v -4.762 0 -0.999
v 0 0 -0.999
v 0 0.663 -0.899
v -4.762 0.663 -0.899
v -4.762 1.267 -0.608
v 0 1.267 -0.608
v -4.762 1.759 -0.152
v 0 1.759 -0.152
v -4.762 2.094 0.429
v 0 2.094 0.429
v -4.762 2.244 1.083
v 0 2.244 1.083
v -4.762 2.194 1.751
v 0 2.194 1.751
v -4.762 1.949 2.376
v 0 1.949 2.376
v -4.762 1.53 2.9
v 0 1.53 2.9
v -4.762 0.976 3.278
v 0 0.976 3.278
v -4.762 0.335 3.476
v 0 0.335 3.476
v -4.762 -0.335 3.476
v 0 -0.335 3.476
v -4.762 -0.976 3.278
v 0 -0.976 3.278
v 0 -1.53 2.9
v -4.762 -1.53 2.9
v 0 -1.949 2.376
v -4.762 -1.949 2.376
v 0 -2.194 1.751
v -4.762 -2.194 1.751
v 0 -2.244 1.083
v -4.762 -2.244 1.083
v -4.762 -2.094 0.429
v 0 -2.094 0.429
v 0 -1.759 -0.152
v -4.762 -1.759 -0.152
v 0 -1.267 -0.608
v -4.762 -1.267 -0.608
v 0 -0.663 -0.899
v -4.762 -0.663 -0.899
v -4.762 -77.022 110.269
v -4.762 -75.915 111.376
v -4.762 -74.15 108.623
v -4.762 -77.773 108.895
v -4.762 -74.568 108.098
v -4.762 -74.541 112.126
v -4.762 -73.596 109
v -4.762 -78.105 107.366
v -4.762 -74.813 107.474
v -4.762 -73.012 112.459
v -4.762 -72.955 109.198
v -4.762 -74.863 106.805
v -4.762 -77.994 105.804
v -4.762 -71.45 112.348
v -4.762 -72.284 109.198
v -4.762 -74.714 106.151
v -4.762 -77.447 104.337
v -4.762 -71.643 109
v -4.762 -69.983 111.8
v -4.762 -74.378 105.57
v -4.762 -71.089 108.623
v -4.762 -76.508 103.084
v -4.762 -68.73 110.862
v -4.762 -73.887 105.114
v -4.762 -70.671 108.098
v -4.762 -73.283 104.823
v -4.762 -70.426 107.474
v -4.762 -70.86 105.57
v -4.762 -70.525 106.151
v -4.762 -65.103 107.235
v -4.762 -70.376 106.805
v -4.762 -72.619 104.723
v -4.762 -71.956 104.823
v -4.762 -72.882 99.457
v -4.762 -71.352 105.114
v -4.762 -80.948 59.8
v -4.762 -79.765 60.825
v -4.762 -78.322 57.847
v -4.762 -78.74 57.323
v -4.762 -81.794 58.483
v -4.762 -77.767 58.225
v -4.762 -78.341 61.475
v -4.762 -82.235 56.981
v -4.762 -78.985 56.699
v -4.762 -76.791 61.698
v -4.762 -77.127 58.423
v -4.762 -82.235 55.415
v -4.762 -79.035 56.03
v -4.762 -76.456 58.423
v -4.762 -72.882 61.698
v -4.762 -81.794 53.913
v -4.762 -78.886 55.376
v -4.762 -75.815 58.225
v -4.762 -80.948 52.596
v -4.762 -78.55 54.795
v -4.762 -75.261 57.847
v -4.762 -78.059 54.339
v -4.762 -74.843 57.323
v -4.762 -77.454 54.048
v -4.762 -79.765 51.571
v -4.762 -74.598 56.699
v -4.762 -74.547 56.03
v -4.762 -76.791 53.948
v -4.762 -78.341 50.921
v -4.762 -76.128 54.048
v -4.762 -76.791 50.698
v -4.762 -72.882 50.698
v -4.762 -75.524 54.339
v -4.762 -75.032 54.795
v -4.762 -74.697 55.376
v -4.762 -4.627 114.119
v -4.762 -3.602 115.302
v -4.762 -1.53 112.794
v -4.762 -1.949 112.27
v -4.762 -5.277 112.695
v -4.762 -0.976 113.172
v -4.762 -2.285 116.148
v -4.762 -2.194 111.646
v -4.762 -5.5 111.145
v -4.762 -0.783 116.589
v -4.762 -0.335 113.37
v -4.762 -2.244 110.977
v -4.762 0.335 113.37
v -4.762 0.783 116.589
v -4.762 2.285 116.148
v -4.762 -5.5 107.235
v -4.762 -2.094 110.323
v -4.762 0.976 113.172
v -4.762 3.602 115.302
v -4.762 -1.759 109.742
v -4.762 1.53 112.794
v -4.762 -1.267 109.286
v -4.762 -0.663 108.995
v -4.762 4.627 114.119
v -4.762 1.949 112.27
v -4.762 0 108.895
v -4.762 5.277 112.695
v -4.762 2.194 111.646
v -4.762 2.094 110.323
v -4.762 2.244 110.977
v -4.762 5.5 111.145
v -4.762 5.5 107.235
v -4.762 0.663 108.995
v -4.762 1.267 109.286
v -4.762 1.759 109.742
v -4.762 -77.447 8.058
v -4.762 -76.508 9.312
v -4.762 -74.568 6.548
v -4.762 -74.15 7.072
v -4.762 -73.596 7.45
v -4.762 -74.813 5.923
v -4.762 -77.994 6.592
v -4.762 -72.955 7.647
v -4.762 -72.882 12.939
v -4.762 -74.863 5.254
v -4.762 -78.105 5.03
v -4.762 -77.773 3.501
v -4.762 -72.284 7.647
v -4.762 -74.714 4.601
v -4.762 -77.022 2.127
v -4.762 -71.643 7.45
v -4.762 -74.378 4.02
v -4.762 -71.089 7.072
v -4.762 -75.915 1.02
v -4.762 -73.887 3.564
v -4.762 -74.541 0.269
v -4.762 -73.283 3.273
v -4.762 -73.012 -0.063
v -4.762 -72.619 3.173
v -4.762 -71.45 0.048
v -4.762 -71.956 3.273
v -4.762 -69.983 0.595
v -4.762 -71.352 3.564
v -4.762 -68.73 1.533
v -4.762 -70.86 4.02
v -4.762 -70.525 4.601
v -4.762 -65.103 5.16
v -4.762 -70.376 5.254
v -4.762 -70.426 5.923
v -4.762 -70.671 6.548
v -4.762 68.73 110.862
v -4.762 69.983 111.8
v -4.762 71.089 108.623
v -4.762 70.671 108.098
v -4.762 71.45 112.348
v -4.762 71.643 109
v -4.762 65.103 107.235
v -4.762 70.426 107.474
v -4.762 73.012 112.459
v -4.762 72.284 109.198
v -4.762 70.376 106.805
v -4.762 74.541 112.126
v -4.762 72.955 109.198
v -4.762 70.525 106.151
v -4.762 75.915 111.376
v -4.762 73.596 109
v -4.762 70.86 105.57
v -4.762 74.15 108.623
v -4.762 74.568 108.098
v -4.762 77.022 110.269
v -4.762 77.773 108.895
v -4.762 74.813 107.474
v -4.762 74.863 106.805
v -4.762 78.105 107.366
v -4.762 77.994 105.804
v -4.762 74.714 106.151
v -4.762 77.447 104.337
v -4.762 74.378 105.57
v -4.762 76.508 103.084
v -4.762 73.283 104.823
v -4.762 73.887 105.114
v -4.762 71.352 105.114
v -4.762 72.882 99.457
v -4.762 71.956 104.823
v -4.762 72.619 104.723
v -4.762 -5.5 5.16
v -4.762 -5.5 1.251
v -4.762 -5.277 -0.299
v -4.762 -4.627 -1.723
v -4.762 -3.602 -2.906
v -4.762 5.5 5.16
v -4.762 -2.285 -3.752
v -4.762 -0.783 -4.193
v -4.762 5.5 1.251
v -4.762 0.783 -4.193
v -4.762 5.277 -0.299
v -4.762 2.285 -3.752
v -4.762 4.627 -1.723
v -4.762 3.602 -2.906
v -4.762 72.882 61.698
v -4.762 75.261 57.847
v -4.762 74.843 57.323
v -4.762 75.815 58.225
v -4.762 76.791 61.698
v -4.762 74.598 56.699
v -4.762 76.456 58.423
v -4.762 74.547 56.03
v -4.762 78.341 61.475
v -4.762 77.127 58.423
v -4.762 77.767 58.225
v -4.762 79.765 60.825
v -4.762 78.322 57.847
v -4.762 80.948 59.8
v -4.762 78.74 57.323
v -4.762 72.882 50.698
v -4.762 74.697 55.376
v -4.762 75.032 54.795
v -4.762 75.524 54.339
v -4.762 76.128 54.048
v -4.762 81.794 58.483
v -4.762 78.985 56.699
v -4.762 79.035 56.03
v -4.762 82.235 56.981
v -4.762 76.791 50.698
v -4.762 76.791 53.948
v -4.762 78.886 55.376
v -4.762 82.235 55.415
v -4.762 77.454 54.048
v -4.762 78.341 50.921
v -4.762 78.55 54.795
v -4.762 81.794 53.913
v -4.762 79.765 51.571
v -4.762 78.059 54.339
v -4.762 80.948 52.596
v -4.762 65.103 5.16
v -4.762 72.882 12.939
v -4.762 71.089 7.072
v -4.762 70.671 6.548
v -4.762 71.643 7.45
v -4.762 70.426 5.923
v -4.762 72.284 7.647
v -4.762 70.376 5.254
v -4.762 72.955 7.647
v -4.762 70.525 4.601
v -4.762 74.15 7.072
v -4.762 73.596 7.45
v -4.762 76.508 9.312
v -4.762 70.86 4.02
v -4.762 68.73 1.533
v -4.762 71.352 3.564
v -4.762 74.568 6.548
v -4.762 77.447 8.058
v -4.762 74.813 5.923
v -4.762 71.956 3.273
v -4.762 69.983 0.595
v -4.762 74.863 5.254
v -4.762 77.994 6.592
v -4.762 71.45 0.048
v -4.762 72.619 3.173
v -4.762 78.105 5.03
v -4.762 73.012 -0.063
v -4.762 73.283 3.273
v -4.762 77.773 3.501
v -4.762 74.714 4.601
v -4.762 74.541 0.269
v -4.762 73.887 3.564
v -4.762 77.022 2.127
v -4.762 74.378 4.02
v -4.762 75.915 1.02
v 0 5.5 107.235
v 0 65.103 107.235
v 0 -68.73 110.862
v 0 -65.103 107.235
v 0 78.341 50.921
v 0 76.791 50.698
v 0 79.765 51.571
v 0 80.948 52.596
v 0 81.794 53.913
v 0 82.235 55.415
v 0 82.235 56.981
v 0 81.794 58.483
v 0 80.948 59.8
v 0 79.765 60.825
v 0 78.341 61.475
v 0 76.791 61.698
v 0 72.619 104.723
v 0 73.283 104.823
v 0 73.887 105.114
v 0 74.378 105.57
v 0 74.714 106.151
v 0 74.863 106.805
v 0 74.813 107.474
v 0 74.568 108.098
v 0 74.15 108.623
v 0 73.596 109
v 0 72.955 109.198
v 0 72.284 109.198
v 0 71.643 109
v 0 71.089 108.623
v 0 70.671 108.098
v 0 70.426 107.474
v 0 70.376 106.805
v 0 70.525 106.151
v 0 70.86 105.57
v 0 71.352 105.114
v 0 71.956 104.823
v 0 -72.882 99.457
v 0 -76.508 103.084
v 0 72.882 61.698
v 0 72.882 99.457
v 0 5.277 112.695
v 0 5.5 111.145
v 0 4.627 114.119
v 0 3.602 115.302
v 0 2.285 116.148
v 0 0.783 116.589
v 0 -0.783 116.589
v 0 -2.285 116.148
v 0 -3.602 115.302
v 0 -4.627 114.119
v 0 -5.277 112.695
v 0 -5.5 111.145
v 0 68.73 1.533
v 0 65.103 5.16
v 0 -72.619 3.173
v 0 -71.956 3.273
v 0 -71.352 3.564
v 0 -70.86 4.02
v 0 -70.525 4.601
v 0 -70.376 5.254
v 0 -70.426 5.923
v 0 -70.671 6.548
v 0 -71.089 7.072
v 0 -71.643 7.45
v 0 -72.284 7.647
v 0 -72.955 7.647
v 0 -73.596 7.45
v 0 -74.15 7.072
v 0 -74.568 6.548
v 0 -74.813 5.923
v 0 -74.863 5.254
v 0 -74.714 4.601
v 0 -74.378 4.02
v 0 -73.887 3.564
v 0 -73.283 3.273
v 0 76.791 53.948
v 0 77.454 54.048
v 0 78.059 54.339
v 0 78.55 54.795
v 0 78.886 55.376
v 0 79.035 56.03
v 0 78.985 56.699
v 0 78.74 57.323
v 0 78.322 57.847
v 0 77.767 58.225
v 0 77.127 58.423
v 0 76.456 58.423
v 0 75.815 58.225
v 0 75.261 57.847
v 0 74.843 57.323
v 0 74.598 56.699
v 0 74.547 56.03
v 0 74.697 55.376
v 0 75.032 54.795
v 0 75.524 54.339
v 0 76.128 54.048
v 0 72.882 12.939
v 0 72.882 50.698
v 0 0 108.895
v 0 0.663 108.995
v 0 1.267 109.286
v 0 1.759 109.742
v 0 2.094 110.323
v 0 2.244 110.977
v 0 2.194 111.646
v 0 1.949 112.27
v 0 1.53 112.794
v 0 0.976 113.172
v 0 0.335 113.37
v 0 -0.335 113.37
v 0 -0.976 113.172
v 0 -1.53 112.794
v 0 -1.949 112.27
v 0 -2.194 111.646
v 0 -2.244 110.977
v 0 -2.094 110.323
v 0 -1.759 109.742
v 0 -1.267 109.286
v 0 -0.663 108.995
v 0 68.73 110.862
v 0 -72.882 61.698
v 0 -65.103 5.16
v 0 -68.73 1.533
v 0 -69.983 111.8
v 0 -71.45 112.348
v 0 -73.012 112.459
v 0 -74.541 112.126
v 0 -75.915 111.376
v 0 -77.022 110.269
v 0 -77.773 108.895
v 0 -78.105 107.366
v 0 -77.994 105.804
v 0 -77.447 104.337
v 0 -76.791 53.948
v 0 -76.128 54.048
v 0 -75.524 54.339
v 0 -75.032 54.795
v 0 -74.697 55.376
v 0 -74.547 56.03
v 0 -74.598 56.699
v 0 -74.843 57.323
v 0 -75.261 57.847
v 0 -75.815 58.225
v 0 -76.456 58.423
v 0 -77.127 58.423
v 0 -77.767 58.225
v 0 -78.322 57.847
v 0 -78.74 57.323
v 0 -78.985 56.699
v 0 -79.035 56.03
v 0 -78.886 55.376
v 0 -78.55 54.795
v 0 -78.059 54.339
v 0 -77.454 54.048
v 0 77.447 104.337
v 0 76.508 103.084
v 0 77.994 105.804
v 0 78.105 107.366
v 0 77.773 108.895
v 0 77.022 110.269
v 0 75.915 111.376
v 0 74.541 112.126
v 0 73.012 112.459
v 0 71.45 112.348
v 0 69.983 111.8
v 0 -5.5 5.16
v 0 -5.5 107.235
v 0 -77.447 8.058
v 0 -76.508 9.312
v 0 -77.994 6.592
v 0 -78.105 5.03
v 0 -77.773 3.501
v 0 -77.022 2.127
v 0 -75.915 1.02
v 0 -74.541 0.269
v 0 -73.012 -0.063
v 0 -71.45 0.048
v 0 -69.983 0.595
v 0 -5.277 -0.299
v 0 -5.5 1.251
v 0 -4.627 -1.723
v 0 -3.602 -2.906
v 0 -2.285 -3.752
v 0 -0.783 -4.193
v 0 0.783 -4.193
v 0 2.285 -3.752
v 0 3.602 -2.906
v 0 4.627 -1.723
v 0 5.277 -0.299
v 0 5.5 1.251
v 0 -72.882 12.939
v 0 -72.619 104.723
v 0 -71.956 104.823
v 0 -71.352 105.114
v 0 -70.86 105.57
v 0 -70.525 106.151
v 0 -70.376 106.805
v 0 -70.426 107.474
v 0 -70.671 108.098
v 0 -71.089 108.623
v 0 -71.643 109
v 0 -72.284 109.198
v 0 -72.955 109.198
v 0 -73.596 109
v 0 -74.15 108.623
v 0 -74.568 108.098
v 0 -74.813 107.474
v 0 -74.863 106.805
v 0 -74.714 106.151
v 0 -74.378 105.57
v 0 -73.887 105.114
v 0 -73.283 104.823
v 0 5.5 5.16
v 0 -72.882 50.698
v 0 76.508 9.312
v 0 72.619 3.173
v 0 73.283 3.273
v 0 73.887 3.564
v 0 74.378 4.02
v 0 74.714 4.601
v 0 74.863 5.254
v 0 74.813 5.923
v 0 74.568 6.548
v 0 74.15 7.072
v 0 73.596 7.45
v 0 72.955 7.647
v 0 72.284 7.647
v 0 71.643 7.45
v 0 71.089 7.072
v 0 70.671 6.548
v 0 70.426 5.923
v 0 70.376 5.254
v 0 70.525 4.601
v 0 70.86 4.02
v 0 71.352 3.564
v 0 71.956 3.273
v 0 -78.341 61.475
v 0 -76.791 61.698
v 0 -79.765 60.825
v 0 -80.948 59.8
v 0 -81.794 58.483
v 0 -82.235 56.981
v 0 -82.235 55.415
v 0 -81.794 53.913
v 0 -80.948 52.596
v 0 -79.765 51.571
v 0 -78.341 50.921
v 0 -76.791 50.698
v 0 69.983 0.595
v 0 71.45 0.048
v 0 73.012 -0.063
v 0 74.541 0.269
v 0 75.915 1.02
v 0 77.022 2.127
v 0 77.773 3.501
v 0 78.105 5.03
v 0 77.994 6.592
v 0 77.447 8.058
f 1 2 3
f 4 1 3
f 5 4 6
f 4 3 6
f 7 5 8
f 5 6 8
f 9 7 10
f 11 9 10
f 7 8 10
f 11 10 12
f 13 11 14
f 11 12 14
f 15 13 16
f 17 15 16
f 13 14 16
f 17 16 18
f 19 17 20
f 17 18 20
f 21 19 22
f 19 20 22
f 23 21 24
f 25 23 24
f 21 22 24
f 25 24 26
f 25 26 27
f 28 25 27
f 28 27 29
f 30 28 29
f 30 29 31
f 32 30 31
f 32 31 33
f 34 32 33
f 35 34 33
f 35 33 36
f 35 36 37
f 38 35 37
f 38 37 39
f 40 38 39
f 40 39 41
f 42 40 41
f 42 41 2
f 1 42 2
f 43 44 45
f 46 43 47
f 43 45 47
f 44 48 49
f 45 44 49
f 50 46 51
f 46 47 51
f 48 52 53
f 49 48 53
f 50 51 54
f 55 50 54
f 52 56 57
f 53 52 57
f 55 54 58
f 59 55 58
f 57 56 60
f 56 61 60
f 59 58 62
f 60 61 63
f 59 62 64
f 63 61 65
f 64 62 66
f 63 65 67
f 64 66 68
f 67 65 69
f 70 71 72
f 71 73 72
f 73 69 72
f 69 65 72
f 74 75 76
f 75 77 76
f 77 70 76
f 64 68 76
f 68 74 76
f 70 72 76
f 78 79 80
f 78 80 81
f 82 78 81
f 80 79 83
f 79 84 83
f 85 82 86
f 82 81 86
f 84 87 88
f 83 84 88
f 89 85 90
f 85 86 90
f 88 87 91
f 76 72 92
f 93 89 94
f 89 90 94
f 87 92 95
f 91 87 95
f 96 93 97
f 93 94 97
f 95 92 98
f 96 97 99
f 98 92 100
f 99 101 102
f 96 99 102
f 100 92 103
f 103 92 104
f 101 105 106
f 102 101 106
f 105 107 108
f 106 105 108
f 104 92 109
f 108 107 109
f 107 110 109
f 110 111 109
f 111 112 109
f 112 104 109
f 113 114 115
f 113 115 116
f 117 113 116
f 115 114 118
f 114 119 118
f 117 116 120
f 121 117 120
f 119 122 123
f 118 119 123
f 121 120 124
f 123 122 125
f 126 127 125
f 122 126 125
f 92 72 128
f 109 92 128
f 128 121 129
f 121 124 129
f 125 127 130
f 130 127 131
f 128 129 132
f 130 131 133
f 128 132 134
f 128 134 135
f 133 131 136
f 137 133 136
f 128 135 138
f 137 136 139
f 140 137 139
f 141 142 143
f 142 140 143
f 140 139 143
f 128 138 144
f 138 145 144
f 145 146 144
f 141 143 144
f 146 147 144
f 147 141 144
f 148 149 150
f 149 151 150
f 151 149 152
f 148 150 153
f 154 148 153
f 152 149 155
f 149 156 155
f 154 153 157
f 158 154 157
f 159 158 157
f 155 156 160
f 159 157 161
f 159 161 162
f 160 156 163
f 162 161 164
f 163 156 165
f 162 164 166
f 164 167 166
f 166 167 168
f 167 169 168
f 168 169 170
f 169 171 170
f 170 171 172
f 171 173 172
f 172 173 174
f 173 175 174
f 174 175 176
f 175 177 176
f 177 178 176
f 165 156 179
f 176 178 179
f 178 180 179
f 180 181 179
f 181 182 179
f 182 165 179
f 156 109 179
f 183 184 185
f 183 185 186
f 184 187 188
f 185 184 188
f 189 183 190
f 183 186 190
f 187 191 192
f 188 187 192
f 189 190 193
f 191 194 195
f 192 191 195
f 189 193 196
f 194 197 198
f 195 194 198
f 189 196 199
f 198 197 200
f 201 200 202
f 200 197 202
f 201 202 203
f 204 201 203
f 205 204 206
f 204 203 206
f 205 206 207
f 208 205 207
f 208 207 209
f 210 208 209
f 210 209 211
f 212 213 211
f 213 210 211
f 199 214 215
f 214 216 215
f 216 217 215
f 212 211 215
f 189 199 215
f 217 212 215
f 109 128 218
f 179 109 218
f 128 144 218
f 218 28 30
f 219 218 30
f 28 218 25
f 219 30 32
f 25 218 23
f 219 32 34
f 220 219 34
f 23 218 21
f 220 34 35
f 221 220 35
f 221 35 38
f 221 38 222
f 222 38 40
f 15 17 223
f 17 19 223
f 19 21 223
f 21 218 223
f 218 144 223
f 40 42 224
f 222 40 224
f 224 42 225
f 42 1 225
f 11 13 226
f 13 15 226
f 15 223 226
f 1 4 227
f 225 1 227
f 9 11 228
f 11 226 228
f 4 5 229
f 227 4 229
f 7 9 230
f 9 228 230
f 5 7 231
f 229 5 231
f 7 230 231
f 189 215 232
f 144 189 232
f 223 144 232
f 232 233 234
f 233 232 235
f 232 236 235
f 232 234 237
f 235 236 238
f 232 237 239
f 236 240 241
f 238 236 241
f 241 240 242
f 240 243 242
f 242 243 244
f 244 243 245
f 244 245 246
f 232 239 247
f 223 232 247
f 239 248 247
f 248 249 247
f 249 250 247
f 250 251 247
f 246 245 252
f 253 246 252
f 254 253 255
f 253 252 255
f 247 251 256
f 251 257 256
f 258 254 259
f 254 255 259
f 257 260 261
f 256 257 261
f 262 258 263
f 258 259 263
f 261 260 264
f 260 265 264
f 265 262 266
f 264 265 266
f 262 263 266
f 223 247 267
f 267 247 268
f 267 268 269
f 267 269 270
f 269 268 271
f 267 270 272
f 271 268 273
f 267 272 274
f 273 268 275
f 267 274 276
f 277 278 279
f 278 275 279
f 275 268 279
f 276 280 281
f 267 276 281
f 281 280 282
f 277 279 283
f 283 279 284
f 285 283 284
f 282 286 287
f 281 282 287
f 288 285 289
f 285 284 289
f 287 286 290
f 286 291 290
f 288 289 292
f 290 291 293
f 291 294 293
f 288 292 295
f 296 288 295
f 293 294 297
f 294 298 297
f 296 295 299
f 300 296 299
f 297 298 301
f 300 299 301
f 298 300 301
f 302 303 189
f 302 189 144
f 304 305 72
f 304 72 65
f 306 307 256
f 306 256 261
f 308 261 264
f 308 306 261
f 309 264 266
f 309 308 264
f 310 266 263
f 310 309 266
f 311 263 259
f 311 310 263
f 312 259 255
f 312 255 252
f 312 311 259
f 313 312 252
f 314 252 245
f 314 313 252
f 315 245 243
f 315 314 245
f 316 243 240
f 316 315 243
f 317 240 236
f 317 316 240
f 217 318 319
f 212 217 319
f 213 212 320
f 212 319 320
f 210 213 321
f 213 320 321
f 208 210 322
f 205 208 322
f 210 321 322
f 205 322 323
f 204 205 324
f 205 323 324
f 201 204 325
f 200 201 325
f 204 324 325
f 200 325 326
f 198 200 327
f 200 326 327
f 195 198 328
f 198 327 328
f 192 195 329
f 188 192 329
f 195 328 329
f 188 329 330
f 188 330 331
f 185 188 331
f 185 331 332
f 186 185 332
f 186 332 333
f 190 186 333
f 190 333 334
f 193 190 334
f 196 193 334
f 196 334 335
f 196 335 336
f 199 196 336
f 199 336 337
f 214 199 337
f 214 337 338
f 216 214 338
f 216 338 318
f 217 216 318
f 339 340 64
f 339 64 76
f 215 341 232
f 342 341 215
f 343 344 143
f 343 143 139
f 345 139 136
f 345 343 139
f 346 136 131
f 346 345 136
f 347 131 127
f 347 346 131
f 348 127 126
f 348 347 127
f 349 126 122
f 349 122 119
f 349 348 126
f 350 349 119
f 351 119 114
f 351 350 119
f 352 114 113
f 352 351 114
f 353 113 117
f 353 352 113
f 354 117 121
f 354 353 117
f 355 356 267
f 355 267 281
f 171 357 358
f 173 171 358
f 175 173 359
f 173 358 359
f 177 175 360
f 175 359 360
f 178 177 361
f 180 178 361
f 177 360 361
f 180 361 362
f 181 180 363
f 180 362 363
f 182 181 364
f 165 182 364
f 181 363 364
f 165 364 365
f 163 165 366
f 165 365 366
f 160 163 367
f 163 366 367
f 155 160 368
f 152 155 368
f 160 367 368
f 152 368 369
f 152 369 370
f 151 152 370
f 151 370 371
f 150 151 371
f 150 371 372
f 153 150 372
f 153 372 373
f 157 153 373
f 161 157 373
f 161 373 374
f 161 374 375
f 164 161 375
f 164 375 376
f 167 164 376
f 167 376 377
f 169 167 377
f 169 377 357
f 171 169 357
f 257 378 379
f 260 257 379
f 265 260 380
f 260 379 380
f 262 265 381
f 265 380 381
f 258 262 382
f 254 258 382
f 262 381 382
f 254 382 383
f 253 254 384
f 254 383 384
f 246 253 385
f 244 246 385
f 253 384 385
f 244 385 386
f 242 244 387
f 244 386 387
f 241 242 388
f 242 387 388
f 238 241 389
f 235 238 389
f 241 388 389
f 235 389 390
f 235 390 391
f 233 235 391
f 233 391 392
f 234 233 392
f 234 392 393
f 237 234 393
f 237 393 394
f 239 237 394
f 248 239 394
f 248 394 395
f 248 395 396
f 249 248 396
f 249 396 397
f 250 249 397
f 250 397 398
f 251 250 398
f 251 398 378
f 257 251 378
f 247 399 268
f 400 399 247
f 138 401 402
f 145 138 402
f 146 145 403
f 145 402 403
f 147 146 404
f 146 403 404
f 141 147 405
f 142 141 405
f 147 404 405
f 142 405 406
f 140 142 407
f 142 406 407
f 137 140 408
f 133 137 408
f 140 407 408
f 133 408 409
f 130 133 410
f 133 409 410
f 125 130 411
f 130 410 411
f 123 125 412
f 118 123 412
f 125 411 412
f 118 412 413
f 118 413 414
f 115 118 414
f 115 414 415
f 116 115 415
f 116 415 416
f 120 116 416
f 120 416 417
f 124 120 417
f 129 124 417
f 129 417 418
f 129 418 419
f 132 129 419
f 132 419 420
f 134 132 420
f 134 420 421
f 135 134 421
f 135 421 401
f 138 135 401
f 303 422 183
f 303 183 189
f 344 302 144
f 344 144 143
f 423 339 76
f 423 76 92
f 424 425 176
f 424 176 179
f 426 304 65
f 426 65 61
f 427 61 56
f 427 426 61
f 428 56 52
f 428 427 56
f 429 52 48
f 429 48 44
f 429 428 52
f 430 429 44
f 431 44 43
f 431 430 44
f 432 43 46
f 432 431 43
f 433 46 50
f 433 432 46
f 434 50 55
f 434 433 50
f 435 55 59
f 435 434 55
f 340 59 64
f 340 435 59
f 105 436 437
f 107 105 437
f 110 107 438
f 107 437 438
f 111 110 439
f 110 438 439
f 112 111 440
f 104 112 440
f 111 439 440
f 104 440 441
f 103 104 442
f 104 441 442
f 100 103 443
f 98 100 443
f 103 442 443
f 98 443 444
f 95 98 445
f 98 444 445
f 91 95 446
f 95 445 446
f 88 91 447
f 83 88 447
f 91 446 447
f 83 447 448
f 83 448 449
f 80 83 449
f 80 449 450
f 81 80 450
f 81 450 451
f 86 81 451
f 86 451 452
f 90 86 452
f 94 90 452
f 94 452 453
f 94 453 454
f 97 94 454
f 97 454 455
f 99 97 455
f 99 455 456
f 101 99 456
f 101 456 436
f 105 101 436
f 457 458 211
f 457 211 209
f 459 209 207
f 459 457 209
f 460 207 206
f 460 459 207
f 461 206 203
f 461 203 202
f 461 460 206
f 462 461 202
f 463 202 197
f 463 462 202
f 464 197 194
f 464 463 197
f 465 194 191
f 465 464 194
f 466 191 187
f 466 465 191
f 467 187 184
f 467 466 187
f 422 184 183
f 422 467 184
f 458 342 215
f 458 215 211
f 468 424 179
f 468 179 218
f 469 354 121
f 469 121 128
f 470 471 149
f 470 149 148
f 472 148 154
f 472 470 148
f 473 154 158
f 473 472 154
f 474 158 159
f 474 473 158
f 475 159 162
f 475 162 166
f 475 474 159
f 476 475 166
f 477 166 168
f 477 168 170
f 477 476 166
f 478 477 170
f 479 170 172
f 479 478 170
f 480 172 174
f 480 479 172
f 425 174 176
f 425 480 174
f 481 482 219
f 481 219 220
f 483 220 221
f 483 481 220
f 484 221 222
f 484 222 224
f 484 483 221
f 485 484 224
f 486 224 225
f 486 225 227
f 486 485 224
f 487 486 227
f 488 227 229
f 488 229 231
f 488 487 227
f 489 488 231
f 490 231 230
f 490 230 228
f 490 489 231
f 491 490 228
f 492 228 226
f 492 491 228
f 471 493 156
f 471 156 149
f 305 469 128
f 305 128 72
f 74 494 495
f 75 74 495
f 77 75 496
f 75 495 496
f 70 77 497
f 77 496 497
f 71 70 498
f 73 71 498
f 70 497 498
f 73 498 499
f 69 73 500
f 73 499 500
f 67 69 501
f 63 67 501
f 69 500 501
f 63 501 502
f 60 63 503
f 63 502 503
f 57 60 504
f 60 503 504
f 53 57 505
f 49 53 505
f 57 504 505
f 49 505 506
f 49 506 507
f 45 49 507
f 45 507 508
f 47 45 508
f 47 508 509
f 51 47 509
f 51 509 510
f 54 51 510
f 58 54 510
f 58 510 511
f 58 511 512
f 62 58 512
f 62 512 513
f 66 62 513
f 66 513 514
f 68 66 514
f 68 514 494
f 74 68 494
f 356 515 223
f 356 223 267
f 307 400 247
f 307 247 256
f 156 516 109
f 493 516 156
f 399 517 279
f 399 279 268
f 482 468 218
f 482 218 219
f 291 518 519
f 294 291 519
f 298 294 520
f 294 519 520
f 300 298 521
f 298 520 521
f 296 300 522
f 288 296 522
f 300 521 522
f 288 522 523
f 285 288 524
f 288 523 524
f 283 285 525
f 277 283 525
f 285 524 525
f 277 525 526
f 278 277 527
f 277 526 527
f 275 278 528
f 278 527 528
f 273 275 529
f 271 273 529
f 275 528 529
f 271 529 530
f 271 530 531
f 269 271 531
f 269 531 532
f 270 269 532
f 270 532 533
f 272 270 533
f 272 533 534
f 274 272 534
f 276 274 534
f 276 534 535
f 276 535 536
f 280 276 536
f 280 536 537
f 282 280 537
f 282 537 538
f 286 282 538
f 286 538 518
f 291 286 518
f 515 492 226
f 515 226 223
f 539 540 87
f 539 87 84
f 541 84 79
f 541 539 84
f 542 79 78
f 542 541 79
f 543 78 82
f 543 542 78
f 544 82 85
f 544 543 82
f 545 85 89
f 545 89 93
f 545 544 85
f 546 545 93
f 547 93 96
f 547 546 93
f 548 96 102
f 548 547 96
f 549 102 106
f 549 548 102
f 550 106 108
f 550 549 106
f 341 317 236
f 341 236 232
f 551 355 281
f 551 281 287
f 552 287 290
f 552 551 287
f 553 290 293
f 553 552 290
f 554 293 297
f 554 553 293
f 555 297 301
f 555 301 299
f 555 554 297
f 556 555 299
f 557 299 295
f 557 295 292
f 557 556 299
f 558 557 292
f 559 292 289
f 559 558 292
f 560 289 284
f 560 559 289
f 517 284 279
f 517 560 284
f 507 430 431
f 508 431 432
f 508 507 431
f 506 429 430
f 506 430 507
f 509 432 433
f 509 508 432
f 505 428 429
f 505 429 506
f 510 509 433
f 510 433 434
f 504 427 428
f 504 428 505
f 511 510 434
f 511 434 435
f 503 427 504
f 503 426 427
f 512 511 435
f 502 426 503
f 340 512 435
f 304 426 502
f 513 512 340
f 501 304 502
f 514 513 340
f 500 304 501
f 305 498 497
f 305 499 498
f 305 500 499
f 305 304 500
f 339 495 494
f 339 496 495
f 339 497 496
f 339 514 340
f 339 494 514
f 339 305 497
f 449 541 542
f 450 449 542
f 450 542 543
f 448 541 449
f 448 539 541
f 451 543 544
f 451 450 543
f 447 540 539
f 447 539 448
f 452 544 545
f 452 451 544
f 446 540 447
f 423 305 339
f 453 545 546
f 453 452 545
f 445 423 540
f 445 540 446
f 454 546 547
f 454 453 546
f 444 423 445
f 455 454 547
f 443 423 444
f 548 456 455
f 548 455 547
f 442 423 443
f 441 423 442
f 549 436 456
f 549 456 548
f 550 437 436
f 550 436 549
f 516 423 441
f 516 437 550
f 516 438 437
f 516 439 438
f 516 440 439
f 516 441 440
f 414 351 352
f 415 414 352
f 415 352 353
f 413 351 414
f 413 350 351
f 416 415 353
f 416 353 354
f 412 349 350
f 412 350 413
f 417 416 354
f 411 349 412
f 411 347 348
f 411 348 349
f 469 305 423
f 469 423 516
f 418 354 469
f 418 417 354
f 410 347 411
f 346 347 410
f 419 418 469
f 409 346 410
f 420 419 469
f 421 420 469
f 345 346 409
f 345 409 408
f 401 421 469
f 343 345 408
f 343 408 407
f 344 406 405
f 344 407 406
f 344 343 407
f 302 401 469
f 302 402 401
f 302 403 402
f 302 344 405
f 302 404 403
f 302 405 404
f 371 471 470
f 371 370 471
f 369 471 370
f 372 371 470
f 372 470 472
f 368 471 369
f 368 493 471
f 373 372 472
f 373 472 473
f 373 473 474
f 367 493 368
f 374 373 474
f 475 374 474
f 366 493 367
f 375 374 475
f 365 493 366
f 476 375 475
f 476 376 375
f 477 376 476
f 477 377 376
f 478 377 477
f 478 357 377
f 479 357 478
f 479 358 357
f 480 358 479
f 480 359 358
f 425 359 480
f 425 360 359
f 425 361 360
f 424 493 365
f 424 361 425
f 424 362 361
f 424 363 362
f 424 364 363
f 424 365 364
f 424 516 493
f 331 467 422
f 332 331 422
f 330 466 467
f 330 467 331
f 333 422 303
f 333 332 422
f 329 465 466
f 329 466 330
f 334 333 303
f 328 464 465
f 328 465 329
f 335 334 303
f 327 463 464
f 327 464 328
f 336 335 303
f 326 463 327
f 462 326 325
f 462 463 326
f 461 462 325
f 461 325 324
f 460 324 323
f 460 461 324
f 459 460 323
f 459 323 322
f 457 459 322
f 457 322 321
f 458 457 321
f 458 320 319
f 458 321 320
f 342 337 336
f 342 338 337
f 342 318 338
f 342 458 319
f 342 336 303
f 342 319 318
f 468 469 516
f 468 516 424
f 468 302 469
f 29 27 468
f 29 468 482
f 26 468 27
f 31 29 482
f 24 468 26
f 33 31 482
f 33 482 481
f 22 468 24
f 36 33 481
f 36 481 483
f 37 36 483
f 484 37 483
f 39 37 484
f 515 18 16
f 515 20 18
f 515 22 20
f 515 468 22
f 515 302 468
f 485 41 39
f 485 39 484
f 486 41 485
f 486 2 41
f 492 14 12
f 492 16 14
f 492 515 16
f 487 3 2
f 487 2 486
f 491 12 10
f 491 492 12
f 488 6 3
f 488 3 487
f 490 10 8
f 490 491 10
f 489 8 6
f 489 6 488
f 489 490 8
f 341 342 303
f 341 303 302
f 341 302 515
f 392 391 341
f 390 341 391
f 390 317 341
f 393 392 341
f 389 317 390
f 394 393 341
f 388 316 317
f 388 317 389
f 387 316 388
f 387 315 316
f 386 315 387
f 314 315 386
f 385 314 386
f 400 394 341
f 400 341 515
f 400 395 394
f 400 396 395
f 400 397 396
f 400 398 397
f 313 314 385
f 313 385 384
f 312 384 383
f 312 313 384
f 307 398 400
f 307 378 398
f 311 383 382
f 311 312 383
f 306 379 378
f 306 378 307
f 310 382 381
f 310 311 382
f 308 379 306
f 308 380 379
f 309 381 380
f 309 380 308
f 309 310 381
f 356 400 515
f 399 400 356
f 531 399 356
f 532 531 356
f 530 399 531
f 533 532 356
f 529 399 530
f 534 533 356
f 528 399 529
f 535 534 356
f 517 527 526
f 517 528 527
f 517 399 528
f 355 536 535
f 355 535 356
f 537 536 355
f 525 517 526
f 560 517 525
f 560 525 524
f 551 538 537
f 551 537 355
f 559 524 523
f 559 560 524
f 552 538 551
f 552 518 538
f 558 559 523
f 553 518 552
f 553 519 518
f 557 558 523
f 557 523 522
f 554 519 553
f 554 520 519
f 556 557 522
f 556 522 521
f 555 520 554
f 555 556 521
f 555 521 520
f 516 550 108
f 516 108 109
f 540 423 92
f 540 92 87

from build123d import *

# Parameters (mm, degrees)
BOSS_EXTRUDE1_DEPTH  = 4.7625
M4_CLEARANCE_HOLE1_D = 4.5


with BuildPart() as part:
    # Sketch1 → Boss-Extrude1 (new body)
    with BuildSketch(Plane(origin=(0, 0, 0), x_dir=(0, 0, -1), z_dir=(1, 0, 0))):
        with BuildLine():
            Line((-12.938571051, 72.8815), (-50.697896458, 72.8815))
            Line((-50.697896458, 72.8815), (-50.697896458, 76.7912))
            ThreePointArc((-50.697896458, 76.7912), (-56.197896458, 82.2912), (-61.697896458, 76.7912))
            Line((-61.697896458, 76.7912), (-61.697896458, 72.8815))
            Line((-61.697896458, 72.8815), (-99.457221865, 72.8815))
            Line((-99.457221865, 72.8815), (-103.084126021, 76.508404156))
            ThreePointArc((-103.084126021, 76.508404156), (-110.862300614, 76.508404156), (-110.862300614, 68.730229563))
            Line((-110.862300614, 68.730229563), (-107.235396458, 65.103325407))
            Line((-107.235396458, 65.103325407), (-107.235396458, 5.5))
            Line((-107.235396458, 5.5), (-111.145096458, 5.5))
            ThreePointArc((-111.145096458, 5.5), (-116.645096458, 0), (-111.145096458, -5.5))
            Line((-111.145096458, -5.5), (-107.235396458, -5.5))
            Line((-107.235396458, -5.5), (-107.235396458, -65.103325407))
            Line((-107.235396458, -65.103325407), (-110.862300614, -68.730229563))
            ThreePointArc((-110.862300614, -68.730229563), (-110.862300614, -76.508404156), (-103.084126021, -76.508404156))
            Line((-103.084126021, -76.508404156), (-99.457221865, -72.8815))
            Line((-99.457221865, -72.8815), (-61.697896458, -72.8815))
            Line((-61.697896458, -72.8815), (-61.697896458, -76.7912))
            ThreePointArc((-61.697896458, -76.7912), (-56.197896458, -82.2912), (-50.697896458, -76.7912))
            Line((-50.697896458, -76.7912), (-50.697896458, -72.8815))
            Line((-50.697896458, -72.8815), (-12.938571051, -72.8815))
            Line((-12.938571051, -72.8815), (-9.311666896, -76.508404156))
            ThreePointArc((-9.311666896, -76.508404156), (-1.533492302, -76.508404156), (-1.533492302, -68.730229563))
            Line((-1.533492302, -68.730229563), (-5.160396458, -65.103325407))
            Line((-5.160396458, -65.103325407), (-5.160396458, -5.5))
            Line((-5.160396458, -5.5), (-1.250696458, -5.5))
            ThreePointArc((-1.250696458, -5.5), (4.249303542, 0), (-1.250696458, 5.5))
            Line((-1.250696458, 5.5), (-5.160396458, 5.5))
            Line((-5.160396458, 5.5), (-5.160396458, 65.103325407))
            Line((-5.160396458, 65.103325407), (-1.533492302, 68.730229563))
            ThreePointArc((-1.533492302, 68.730229563), (-1.533492302, 76.508404156), (-9.311666896, 76.508404156))
            Line((-9.311666896, 76.508404156), (-12.938571051, 72.8815))
        make_face()
    extrude(amount=-BOSS_EXTRUDE1_DEPTH)

    # M4 Clearance Hole1 (through all)
    with Locations(Plane.ZY.offset(4.7625)):
        with Locations((5.422579599, -72.619316859), (1.250696458, 0), (5.422579599, 72.619316859), (106.973213317, 72.619316859), (111.145096458, 0), (106.973213317, -72.619316859), (56.197896458, -76.7912), (56.197896458, 76.7912)):
            Hole(M4_CLEARANCE_HOLE1_D / 2)


solid = part.part
